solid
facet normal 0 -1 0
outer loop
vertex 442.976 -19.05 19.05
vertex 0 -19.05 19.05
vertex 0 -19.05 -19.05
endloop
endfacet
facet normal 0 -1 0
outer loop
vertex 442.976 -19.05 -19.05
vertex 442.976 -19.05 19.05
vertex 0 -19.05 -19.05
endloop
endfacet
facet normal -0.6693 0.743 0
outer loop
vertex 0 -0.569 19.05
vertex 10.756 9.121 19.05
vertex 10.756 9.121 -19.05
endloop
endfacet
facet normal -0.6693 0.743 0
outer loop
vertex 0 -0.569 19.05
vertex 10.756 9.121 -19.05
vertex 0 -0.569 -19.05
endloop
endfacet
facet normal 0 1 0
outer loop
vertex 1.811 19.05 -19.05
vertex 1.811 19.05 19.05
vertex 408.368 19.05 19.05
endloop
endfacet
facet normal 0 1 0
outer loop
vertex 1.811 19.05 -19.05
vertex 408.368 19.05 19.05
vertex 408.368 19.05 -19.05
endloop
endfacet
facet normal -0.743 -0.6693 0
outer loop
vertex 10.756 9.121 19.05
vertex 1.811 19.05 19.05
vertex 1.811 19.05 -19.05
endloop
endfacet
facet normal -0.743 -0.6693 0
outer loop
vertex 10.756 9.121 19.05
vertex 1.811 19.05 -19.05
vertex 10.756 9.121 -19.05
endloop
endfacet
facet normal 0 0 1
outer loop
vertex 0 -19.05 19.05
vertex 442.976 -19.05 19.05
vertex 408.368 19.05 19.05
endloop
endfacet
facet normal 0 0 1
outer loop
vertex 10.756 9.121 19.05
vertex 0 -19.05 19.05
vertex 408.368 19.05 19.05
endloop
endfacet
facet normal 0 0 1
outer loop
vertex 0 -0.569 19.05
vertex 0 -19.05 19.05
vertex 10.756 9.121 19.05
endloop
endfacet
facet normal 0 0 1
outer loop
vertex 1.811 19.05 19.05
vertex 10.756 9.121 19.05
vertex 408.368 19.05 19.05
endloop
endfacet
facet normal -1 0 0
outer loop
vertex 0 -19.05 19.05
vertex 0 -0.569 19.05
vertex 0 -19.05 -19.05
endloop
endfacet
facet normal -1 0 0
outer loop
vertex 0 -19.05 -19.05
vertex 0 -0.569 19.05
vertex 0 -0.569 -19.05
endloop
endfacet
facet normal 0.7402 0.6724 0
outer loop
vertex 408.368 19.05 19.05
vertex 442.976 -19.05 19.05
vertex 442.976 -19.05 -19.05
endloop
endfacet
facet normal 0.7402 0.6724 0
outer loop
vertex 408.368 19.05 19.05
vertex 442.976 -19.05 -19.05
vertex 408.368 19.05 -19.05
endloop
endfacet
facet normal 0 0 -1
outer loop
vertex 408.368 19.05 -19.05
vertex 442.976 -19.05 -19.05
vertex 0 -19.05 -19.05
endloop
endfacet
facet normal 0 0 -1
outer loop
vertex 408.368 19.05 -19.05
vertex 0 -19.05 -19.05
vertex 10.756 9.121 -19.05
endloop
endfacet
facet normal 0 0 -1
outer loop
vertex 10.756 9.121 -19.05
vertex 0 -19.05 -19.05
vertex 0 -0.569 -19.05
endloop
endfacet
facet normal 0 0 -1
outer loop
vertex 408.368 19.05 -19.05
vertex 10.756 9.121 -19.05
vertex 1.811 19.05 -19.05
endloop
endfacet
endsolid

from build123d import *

# Parameters (mm, degrees)
SKETCH1_W               = 38.1
SKETCH1_H               = 38.1
BOSS_EXTRUDE1_DEPTH     = 442.976
CUT_EXTRUDE1_DEPTH      = 446.019380562
CUT_EXTRUDE2_DEPTH      = 446.019380562
CUT_EXTRUDE2_DEPTH_BACK = 446.019380562


with BuildPart() as part:
    # Sketch1 → Boss-Extrude1 (new body)
    with BuildSketch(Plane(origin=(0, 0, 0), x_dir=(0, 0, -1), z_dir=(1, 0, 0))):
        Rectangle(SKETCH1_W, SKETCH1_H)
    extrude(amount=BOSS_EXTRUDE1_DEPTH)

    # Sketch2 → Cut-Extrude1 (cut, through all)
    with BuildSketch(Plane.XY.offset(19.05)):
        Polygon((442.976, -19.05), (408.36839663, 19.05), (442.976, 19.05), align=None)
    extrude(amount=-CUT_EXTRUDE1_DEPTH, mode=Mode.SUBTRACT)

    # Sketch3 → Cut-Extrude2 (cut, two sides: drawn at the far end of the back side and taken through both)
    with BuildSketch(Plane.XY.offset(19.05).offset(-CUT_EXTRUDE2_DEPTH_BACK)):
        Polygon((0, 19.05), (0, -0.569448187), (1.811202923, 19.05), align=None)
        Polygon((0, -0.569448187), (1.811202923, 19.05), (10.756321618, 9.121476911), align=None)
    extrude(amount=CUT_EXTRUDE2_DEPTH + CUT_EXTRUDE2_DEPTH_BACK, mode=Mode.SUBTRACT)


solid = part.part
